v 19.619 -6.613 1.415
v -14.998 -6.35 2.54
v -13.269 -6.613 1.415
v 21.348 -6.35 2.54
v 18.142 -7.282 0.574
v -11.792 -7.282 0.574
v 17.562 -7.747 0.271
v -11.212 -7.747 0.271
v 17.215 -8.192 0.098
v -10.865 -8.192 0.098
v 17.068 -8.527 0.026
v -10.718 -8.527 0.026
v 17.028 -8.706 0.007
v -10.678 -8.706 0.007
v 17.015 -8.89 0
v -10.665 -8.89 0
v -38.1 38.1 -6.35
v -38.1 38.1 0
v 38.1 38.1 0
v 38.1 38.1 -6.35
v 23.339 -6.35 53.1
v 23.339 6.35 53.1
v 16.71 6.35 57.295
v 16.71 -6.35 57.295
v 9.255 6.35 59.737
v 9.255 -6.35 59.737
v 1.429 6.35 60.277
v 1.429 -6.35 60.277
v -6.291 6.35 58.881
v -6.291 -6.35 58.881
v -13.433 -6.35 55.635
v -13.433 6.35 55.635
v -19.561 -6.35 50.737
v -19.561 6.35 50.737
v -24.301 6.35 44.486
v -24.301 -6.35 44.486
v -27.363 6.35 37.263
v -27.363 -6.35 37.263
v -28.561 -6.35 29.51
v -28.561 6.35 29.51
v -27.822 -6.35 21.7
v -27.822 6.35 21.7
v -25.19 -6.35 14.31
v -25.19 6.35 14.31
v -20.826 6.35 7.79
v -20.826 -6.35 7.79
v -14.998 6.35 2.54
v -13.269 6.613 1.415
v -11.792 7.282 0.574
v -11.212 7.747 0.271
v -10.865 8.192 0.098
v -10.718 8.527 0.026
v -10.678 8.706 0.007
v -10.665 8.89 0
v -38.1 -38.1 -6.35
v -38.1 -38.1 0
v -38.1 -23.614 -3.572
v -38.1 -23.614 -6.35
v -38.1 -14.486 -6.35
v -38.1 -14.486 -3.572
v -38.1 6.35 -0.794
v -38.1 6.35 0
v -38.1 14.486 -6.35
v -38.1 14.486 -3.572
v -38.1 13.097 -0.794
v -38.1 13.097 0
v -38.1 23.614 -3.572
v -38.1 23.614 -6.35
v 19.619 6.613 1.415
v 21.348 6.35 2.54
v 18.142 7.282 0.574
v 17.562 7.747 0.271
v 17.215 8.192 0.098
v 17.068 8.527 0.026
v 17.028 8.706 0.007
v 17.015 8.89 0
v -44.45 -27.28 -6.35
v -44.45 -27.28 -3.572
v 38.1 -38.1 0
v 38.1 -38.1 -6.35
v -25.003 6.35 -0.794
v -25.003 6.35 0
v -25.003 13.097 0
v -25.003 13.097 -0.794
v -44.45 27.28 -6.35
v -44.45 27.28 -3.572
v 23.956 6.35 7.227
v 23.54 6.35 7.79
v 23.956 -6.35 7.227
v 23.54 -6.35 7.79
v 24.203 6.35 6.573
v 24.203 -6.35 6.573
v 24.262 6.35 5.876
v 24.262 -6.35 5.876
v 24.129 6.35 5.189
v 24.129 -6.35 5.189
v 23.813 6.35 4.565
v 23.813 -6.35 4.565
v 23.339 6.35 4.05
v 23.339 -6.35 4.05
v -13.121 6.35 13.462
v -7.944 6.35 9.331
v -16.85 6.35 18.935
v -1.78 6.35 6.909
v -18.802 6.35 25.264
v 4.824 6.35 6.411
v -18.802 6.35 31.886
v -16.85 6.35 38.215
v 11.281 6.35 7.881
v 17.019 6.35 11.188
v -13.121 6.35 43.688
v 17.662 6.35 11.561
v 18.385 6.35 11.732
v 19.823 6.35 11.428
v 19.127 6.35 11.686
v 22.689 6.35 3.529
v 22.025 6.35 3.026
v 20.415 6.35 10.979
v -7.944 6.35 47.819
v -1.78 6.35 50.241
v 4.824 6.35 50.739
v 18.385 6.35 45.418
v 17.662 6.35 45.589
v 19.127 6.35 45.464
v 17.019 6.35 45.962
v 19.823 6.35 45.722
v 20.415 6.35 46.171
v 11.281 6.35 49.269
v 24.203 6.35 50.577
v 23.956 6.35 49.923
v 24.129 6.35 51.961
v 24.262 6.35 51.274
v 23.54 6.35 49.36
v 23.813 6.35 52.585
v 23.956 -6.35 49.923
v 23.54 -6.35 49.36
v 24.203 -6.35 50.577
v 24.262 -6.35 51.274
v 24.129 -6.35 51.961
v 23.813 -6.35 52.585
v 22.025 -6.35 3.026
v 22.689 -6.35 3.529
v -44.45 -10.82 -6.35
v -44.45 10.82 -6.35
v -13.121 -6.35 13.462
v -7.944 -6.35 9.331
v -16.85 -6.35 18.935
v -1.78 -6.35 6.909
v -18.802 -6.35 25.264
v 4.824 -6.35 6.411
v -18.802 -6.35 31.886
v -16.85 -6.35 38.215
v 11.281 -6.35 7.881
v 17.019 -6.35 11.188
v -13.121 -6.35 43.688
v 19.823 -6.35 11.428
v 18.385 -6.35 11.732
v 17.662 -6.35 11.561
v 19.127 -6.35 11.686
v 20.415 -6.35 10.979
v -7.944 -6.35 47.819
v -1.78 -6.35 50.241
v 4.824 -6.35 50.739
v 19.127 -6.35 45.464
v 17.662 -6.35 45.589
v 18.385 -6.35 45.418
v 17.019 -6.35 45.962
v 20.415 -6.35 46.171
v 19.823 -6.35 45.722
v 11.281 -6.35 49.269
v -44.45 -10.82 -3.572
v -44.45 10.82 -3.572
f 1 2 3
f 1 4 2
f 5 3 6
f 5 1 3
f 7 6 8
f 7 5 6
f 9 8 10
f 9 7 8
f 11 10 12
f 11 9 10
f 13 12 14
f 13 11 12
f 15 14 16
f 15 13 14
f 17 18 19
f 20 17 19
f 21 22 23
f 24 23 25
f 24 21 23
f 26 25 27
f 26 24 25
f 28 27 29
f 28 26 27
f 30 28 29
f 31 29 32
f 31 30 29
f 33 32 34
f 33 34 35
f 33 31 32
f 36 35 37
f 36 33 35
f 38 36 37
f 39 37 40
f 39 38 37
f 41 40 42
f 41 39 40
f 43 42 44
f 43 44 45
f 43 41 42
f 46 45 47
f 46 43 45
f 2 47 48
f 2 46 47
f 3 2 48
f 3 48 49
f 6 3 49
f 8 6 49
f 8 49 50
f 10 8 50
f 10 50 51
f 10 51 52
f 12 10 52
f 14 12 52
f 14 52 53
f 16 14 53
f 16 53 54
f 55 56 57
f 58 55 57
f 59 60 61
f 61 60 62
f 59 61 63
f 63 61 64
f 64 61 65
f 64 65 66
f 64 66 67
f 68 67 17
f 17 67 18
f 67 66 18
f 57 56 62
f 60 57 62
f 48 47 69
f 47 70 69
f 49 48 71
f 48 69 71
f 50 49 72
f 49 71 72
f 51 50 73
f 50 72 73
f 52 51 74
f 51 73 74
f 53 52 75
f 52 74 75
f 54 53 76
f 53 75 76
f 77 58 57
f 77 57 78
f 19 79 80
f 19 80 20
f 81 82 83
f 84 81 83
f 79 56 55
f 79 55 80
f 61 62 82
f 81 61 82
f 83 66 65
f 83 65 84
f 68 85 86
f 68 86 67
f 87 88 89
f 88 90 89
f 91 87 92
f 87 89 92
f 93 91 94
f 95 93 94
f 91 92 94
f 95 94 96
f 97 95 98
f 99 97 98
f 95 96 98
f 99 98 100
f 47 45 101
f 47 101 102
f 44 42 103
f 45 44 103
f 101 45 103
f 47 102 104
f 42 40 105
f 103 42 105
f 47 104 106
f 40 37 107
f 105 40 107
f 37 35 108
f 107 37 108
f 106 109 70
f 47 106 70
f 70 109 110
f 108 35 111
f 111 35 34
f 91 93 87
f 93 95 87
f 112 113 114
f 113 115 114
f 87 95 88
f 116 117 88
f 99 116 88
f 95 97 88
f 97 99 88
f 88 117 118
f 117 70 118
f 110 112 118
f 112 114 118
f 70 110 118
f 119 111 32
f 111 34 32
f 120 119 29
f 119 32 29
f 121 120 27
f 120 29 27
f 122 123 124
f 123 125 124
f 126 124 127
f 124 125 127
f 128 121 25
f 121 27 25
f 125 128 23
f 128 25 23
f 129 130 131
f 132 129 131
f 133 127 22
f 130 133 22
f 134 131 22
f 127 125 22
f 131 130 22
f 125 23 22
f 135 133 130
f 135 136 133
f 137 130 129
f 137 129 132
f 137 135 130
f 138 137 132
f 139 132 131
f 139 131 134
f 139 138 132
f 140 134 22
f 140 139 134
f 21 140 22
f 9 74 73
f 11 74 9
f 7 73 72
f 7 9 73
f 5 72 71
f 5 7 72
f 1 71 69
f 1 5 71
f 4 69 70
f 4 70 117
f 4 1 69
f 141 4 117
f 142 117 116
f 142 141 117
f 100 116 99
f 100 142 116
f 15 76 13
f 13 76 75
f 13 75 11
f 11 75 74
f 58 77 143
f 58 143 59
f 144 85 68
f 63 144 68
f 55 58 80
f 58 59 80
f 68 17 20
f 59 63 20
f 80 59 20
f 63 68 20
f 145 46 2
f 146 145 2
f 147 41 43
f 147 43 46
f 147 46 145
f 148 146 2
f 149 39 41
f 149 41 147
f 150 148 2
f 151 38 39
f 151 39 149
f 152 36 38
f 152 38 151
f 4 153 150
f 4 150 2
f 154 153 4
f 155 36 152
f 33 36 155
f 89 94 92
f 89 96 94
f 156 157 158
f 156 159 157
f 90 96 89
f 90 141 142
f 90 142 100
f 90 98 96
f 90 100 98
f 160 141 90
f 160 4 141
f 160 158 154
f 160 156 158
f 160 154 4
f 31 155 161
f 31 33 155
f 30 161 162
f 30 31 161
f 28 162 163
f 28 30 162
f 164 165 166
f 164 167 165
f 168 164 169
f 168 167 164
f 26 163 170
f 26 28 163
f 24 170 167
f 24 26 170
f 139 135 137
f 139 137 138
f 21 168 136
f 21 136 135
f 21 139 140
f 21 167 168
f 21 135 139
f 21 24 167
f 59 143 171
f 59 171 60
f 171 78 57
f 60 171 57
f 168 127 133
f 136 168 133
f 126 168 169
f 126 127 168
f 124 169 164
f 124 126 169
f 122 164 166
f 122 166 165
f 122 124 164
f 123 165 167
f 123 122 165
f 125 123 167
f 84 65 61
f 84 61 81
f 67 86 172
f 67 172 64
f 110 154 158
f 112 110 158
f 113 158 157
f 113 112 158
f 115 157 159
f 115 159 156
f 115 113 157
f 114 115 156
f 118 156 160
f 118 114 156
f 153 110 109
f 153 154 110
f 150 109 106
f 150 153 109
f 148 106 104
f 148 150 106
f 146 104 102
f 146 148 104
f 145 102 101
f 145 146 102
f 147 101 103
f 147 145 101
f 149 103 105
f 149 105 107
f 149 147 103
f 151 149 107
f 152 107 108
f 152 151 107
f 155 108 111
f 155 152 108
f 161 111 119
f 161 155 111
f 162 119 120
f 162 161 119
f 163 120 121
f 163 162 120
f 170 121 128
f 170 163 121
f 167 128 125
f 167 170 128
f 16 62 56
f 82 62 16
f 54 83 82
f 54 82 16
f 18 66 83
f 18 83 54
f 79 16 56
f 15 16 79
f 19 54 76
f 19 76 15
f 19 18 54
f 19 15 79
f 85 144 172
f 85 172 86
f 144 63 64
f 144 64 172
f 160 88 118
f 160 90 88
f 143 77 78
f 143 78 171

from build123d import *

# Parameters (mm, degrees)
F0_W     = 76.2
F0_H     = 76.2
F2_DEPTH = 6.35
F3_DEPTH = 6.35
F4_R     = 2.54
F6_DEPTH = 2.778125
F7_W     = 13.096875
F7_H     = 6.746875
F8_DEPTH = 0.79375


with BuildPart() as f2:
    # F0 (on Top) → F2 (new body)
    with BuildSketch(Plane.XY):
        Rectangle(F0_W, F0_H)
    extrude(amount=-F2_DEPTH)

    # F1 (on Front) → F3 (join, symmetric)
    with BuildSketch(Plane.XZ):
        with BuildLine():
            Line((18.7292598667, 44.45), (25.3953712381, 51.2535714286))
            ThreePointArc((25.3953712381, 51.2535714286), (-28.575, 28.575), (25.3953712381, 5.8964285714))
            Line((25.3953712381, 5.8964285714), (18.7292598667, 12.7))
            ThreePointArc((18.7292598667, 12.7), (-19.05, 28.575), (18.7292598667, 44.45))
        make_face()
    extrude(amount=F3_DEPTH, both=True)

    # F4
    f4_edges = [f2.edges().sort_by_distance(p)[0] for p in [
        (25.395371, 0, 51.253571),
        (18.72926, 0, 44.45),
        (18.72926, 0, 12.7),
        (25.395371, 0, 5.896429),
        (3.175, -6.35, 0),
        (3.175, 6.35, 0),
    ]]
    fillet(f4_edges, radius=F4_R)

    # F5 (on face) → F6 (join)
    with BuildSketch(Plane(origin=(0, 0, -6.35), x_dir=(1, 0, 0), z_dir=(0, 0, -1))):
        Polygon((-38.1, 14.4859375), (-38.1, 23.6140625), (-44.45, 27.2802367094), (-44.45, 10.8197632906), align=None)
        Polygon((-38.1, -23.6140625), (-38.1, -14.4859375), (-44.45, -10.8197632906), (-44.45, -27.2802367094), align=None)
    extrude(amount=-F6_DEPTH)

    # F7 (on face) → F8 (cut)
    with BuildSketch(Plane.XY):
        with Locations((-31.5515625, 9.7234375)):
            Rectangle(F7_W, F7_H)
    extrude(amount=-F8_DEPTH, mode=Mode.SUBTRACT)


solid = f2.part
